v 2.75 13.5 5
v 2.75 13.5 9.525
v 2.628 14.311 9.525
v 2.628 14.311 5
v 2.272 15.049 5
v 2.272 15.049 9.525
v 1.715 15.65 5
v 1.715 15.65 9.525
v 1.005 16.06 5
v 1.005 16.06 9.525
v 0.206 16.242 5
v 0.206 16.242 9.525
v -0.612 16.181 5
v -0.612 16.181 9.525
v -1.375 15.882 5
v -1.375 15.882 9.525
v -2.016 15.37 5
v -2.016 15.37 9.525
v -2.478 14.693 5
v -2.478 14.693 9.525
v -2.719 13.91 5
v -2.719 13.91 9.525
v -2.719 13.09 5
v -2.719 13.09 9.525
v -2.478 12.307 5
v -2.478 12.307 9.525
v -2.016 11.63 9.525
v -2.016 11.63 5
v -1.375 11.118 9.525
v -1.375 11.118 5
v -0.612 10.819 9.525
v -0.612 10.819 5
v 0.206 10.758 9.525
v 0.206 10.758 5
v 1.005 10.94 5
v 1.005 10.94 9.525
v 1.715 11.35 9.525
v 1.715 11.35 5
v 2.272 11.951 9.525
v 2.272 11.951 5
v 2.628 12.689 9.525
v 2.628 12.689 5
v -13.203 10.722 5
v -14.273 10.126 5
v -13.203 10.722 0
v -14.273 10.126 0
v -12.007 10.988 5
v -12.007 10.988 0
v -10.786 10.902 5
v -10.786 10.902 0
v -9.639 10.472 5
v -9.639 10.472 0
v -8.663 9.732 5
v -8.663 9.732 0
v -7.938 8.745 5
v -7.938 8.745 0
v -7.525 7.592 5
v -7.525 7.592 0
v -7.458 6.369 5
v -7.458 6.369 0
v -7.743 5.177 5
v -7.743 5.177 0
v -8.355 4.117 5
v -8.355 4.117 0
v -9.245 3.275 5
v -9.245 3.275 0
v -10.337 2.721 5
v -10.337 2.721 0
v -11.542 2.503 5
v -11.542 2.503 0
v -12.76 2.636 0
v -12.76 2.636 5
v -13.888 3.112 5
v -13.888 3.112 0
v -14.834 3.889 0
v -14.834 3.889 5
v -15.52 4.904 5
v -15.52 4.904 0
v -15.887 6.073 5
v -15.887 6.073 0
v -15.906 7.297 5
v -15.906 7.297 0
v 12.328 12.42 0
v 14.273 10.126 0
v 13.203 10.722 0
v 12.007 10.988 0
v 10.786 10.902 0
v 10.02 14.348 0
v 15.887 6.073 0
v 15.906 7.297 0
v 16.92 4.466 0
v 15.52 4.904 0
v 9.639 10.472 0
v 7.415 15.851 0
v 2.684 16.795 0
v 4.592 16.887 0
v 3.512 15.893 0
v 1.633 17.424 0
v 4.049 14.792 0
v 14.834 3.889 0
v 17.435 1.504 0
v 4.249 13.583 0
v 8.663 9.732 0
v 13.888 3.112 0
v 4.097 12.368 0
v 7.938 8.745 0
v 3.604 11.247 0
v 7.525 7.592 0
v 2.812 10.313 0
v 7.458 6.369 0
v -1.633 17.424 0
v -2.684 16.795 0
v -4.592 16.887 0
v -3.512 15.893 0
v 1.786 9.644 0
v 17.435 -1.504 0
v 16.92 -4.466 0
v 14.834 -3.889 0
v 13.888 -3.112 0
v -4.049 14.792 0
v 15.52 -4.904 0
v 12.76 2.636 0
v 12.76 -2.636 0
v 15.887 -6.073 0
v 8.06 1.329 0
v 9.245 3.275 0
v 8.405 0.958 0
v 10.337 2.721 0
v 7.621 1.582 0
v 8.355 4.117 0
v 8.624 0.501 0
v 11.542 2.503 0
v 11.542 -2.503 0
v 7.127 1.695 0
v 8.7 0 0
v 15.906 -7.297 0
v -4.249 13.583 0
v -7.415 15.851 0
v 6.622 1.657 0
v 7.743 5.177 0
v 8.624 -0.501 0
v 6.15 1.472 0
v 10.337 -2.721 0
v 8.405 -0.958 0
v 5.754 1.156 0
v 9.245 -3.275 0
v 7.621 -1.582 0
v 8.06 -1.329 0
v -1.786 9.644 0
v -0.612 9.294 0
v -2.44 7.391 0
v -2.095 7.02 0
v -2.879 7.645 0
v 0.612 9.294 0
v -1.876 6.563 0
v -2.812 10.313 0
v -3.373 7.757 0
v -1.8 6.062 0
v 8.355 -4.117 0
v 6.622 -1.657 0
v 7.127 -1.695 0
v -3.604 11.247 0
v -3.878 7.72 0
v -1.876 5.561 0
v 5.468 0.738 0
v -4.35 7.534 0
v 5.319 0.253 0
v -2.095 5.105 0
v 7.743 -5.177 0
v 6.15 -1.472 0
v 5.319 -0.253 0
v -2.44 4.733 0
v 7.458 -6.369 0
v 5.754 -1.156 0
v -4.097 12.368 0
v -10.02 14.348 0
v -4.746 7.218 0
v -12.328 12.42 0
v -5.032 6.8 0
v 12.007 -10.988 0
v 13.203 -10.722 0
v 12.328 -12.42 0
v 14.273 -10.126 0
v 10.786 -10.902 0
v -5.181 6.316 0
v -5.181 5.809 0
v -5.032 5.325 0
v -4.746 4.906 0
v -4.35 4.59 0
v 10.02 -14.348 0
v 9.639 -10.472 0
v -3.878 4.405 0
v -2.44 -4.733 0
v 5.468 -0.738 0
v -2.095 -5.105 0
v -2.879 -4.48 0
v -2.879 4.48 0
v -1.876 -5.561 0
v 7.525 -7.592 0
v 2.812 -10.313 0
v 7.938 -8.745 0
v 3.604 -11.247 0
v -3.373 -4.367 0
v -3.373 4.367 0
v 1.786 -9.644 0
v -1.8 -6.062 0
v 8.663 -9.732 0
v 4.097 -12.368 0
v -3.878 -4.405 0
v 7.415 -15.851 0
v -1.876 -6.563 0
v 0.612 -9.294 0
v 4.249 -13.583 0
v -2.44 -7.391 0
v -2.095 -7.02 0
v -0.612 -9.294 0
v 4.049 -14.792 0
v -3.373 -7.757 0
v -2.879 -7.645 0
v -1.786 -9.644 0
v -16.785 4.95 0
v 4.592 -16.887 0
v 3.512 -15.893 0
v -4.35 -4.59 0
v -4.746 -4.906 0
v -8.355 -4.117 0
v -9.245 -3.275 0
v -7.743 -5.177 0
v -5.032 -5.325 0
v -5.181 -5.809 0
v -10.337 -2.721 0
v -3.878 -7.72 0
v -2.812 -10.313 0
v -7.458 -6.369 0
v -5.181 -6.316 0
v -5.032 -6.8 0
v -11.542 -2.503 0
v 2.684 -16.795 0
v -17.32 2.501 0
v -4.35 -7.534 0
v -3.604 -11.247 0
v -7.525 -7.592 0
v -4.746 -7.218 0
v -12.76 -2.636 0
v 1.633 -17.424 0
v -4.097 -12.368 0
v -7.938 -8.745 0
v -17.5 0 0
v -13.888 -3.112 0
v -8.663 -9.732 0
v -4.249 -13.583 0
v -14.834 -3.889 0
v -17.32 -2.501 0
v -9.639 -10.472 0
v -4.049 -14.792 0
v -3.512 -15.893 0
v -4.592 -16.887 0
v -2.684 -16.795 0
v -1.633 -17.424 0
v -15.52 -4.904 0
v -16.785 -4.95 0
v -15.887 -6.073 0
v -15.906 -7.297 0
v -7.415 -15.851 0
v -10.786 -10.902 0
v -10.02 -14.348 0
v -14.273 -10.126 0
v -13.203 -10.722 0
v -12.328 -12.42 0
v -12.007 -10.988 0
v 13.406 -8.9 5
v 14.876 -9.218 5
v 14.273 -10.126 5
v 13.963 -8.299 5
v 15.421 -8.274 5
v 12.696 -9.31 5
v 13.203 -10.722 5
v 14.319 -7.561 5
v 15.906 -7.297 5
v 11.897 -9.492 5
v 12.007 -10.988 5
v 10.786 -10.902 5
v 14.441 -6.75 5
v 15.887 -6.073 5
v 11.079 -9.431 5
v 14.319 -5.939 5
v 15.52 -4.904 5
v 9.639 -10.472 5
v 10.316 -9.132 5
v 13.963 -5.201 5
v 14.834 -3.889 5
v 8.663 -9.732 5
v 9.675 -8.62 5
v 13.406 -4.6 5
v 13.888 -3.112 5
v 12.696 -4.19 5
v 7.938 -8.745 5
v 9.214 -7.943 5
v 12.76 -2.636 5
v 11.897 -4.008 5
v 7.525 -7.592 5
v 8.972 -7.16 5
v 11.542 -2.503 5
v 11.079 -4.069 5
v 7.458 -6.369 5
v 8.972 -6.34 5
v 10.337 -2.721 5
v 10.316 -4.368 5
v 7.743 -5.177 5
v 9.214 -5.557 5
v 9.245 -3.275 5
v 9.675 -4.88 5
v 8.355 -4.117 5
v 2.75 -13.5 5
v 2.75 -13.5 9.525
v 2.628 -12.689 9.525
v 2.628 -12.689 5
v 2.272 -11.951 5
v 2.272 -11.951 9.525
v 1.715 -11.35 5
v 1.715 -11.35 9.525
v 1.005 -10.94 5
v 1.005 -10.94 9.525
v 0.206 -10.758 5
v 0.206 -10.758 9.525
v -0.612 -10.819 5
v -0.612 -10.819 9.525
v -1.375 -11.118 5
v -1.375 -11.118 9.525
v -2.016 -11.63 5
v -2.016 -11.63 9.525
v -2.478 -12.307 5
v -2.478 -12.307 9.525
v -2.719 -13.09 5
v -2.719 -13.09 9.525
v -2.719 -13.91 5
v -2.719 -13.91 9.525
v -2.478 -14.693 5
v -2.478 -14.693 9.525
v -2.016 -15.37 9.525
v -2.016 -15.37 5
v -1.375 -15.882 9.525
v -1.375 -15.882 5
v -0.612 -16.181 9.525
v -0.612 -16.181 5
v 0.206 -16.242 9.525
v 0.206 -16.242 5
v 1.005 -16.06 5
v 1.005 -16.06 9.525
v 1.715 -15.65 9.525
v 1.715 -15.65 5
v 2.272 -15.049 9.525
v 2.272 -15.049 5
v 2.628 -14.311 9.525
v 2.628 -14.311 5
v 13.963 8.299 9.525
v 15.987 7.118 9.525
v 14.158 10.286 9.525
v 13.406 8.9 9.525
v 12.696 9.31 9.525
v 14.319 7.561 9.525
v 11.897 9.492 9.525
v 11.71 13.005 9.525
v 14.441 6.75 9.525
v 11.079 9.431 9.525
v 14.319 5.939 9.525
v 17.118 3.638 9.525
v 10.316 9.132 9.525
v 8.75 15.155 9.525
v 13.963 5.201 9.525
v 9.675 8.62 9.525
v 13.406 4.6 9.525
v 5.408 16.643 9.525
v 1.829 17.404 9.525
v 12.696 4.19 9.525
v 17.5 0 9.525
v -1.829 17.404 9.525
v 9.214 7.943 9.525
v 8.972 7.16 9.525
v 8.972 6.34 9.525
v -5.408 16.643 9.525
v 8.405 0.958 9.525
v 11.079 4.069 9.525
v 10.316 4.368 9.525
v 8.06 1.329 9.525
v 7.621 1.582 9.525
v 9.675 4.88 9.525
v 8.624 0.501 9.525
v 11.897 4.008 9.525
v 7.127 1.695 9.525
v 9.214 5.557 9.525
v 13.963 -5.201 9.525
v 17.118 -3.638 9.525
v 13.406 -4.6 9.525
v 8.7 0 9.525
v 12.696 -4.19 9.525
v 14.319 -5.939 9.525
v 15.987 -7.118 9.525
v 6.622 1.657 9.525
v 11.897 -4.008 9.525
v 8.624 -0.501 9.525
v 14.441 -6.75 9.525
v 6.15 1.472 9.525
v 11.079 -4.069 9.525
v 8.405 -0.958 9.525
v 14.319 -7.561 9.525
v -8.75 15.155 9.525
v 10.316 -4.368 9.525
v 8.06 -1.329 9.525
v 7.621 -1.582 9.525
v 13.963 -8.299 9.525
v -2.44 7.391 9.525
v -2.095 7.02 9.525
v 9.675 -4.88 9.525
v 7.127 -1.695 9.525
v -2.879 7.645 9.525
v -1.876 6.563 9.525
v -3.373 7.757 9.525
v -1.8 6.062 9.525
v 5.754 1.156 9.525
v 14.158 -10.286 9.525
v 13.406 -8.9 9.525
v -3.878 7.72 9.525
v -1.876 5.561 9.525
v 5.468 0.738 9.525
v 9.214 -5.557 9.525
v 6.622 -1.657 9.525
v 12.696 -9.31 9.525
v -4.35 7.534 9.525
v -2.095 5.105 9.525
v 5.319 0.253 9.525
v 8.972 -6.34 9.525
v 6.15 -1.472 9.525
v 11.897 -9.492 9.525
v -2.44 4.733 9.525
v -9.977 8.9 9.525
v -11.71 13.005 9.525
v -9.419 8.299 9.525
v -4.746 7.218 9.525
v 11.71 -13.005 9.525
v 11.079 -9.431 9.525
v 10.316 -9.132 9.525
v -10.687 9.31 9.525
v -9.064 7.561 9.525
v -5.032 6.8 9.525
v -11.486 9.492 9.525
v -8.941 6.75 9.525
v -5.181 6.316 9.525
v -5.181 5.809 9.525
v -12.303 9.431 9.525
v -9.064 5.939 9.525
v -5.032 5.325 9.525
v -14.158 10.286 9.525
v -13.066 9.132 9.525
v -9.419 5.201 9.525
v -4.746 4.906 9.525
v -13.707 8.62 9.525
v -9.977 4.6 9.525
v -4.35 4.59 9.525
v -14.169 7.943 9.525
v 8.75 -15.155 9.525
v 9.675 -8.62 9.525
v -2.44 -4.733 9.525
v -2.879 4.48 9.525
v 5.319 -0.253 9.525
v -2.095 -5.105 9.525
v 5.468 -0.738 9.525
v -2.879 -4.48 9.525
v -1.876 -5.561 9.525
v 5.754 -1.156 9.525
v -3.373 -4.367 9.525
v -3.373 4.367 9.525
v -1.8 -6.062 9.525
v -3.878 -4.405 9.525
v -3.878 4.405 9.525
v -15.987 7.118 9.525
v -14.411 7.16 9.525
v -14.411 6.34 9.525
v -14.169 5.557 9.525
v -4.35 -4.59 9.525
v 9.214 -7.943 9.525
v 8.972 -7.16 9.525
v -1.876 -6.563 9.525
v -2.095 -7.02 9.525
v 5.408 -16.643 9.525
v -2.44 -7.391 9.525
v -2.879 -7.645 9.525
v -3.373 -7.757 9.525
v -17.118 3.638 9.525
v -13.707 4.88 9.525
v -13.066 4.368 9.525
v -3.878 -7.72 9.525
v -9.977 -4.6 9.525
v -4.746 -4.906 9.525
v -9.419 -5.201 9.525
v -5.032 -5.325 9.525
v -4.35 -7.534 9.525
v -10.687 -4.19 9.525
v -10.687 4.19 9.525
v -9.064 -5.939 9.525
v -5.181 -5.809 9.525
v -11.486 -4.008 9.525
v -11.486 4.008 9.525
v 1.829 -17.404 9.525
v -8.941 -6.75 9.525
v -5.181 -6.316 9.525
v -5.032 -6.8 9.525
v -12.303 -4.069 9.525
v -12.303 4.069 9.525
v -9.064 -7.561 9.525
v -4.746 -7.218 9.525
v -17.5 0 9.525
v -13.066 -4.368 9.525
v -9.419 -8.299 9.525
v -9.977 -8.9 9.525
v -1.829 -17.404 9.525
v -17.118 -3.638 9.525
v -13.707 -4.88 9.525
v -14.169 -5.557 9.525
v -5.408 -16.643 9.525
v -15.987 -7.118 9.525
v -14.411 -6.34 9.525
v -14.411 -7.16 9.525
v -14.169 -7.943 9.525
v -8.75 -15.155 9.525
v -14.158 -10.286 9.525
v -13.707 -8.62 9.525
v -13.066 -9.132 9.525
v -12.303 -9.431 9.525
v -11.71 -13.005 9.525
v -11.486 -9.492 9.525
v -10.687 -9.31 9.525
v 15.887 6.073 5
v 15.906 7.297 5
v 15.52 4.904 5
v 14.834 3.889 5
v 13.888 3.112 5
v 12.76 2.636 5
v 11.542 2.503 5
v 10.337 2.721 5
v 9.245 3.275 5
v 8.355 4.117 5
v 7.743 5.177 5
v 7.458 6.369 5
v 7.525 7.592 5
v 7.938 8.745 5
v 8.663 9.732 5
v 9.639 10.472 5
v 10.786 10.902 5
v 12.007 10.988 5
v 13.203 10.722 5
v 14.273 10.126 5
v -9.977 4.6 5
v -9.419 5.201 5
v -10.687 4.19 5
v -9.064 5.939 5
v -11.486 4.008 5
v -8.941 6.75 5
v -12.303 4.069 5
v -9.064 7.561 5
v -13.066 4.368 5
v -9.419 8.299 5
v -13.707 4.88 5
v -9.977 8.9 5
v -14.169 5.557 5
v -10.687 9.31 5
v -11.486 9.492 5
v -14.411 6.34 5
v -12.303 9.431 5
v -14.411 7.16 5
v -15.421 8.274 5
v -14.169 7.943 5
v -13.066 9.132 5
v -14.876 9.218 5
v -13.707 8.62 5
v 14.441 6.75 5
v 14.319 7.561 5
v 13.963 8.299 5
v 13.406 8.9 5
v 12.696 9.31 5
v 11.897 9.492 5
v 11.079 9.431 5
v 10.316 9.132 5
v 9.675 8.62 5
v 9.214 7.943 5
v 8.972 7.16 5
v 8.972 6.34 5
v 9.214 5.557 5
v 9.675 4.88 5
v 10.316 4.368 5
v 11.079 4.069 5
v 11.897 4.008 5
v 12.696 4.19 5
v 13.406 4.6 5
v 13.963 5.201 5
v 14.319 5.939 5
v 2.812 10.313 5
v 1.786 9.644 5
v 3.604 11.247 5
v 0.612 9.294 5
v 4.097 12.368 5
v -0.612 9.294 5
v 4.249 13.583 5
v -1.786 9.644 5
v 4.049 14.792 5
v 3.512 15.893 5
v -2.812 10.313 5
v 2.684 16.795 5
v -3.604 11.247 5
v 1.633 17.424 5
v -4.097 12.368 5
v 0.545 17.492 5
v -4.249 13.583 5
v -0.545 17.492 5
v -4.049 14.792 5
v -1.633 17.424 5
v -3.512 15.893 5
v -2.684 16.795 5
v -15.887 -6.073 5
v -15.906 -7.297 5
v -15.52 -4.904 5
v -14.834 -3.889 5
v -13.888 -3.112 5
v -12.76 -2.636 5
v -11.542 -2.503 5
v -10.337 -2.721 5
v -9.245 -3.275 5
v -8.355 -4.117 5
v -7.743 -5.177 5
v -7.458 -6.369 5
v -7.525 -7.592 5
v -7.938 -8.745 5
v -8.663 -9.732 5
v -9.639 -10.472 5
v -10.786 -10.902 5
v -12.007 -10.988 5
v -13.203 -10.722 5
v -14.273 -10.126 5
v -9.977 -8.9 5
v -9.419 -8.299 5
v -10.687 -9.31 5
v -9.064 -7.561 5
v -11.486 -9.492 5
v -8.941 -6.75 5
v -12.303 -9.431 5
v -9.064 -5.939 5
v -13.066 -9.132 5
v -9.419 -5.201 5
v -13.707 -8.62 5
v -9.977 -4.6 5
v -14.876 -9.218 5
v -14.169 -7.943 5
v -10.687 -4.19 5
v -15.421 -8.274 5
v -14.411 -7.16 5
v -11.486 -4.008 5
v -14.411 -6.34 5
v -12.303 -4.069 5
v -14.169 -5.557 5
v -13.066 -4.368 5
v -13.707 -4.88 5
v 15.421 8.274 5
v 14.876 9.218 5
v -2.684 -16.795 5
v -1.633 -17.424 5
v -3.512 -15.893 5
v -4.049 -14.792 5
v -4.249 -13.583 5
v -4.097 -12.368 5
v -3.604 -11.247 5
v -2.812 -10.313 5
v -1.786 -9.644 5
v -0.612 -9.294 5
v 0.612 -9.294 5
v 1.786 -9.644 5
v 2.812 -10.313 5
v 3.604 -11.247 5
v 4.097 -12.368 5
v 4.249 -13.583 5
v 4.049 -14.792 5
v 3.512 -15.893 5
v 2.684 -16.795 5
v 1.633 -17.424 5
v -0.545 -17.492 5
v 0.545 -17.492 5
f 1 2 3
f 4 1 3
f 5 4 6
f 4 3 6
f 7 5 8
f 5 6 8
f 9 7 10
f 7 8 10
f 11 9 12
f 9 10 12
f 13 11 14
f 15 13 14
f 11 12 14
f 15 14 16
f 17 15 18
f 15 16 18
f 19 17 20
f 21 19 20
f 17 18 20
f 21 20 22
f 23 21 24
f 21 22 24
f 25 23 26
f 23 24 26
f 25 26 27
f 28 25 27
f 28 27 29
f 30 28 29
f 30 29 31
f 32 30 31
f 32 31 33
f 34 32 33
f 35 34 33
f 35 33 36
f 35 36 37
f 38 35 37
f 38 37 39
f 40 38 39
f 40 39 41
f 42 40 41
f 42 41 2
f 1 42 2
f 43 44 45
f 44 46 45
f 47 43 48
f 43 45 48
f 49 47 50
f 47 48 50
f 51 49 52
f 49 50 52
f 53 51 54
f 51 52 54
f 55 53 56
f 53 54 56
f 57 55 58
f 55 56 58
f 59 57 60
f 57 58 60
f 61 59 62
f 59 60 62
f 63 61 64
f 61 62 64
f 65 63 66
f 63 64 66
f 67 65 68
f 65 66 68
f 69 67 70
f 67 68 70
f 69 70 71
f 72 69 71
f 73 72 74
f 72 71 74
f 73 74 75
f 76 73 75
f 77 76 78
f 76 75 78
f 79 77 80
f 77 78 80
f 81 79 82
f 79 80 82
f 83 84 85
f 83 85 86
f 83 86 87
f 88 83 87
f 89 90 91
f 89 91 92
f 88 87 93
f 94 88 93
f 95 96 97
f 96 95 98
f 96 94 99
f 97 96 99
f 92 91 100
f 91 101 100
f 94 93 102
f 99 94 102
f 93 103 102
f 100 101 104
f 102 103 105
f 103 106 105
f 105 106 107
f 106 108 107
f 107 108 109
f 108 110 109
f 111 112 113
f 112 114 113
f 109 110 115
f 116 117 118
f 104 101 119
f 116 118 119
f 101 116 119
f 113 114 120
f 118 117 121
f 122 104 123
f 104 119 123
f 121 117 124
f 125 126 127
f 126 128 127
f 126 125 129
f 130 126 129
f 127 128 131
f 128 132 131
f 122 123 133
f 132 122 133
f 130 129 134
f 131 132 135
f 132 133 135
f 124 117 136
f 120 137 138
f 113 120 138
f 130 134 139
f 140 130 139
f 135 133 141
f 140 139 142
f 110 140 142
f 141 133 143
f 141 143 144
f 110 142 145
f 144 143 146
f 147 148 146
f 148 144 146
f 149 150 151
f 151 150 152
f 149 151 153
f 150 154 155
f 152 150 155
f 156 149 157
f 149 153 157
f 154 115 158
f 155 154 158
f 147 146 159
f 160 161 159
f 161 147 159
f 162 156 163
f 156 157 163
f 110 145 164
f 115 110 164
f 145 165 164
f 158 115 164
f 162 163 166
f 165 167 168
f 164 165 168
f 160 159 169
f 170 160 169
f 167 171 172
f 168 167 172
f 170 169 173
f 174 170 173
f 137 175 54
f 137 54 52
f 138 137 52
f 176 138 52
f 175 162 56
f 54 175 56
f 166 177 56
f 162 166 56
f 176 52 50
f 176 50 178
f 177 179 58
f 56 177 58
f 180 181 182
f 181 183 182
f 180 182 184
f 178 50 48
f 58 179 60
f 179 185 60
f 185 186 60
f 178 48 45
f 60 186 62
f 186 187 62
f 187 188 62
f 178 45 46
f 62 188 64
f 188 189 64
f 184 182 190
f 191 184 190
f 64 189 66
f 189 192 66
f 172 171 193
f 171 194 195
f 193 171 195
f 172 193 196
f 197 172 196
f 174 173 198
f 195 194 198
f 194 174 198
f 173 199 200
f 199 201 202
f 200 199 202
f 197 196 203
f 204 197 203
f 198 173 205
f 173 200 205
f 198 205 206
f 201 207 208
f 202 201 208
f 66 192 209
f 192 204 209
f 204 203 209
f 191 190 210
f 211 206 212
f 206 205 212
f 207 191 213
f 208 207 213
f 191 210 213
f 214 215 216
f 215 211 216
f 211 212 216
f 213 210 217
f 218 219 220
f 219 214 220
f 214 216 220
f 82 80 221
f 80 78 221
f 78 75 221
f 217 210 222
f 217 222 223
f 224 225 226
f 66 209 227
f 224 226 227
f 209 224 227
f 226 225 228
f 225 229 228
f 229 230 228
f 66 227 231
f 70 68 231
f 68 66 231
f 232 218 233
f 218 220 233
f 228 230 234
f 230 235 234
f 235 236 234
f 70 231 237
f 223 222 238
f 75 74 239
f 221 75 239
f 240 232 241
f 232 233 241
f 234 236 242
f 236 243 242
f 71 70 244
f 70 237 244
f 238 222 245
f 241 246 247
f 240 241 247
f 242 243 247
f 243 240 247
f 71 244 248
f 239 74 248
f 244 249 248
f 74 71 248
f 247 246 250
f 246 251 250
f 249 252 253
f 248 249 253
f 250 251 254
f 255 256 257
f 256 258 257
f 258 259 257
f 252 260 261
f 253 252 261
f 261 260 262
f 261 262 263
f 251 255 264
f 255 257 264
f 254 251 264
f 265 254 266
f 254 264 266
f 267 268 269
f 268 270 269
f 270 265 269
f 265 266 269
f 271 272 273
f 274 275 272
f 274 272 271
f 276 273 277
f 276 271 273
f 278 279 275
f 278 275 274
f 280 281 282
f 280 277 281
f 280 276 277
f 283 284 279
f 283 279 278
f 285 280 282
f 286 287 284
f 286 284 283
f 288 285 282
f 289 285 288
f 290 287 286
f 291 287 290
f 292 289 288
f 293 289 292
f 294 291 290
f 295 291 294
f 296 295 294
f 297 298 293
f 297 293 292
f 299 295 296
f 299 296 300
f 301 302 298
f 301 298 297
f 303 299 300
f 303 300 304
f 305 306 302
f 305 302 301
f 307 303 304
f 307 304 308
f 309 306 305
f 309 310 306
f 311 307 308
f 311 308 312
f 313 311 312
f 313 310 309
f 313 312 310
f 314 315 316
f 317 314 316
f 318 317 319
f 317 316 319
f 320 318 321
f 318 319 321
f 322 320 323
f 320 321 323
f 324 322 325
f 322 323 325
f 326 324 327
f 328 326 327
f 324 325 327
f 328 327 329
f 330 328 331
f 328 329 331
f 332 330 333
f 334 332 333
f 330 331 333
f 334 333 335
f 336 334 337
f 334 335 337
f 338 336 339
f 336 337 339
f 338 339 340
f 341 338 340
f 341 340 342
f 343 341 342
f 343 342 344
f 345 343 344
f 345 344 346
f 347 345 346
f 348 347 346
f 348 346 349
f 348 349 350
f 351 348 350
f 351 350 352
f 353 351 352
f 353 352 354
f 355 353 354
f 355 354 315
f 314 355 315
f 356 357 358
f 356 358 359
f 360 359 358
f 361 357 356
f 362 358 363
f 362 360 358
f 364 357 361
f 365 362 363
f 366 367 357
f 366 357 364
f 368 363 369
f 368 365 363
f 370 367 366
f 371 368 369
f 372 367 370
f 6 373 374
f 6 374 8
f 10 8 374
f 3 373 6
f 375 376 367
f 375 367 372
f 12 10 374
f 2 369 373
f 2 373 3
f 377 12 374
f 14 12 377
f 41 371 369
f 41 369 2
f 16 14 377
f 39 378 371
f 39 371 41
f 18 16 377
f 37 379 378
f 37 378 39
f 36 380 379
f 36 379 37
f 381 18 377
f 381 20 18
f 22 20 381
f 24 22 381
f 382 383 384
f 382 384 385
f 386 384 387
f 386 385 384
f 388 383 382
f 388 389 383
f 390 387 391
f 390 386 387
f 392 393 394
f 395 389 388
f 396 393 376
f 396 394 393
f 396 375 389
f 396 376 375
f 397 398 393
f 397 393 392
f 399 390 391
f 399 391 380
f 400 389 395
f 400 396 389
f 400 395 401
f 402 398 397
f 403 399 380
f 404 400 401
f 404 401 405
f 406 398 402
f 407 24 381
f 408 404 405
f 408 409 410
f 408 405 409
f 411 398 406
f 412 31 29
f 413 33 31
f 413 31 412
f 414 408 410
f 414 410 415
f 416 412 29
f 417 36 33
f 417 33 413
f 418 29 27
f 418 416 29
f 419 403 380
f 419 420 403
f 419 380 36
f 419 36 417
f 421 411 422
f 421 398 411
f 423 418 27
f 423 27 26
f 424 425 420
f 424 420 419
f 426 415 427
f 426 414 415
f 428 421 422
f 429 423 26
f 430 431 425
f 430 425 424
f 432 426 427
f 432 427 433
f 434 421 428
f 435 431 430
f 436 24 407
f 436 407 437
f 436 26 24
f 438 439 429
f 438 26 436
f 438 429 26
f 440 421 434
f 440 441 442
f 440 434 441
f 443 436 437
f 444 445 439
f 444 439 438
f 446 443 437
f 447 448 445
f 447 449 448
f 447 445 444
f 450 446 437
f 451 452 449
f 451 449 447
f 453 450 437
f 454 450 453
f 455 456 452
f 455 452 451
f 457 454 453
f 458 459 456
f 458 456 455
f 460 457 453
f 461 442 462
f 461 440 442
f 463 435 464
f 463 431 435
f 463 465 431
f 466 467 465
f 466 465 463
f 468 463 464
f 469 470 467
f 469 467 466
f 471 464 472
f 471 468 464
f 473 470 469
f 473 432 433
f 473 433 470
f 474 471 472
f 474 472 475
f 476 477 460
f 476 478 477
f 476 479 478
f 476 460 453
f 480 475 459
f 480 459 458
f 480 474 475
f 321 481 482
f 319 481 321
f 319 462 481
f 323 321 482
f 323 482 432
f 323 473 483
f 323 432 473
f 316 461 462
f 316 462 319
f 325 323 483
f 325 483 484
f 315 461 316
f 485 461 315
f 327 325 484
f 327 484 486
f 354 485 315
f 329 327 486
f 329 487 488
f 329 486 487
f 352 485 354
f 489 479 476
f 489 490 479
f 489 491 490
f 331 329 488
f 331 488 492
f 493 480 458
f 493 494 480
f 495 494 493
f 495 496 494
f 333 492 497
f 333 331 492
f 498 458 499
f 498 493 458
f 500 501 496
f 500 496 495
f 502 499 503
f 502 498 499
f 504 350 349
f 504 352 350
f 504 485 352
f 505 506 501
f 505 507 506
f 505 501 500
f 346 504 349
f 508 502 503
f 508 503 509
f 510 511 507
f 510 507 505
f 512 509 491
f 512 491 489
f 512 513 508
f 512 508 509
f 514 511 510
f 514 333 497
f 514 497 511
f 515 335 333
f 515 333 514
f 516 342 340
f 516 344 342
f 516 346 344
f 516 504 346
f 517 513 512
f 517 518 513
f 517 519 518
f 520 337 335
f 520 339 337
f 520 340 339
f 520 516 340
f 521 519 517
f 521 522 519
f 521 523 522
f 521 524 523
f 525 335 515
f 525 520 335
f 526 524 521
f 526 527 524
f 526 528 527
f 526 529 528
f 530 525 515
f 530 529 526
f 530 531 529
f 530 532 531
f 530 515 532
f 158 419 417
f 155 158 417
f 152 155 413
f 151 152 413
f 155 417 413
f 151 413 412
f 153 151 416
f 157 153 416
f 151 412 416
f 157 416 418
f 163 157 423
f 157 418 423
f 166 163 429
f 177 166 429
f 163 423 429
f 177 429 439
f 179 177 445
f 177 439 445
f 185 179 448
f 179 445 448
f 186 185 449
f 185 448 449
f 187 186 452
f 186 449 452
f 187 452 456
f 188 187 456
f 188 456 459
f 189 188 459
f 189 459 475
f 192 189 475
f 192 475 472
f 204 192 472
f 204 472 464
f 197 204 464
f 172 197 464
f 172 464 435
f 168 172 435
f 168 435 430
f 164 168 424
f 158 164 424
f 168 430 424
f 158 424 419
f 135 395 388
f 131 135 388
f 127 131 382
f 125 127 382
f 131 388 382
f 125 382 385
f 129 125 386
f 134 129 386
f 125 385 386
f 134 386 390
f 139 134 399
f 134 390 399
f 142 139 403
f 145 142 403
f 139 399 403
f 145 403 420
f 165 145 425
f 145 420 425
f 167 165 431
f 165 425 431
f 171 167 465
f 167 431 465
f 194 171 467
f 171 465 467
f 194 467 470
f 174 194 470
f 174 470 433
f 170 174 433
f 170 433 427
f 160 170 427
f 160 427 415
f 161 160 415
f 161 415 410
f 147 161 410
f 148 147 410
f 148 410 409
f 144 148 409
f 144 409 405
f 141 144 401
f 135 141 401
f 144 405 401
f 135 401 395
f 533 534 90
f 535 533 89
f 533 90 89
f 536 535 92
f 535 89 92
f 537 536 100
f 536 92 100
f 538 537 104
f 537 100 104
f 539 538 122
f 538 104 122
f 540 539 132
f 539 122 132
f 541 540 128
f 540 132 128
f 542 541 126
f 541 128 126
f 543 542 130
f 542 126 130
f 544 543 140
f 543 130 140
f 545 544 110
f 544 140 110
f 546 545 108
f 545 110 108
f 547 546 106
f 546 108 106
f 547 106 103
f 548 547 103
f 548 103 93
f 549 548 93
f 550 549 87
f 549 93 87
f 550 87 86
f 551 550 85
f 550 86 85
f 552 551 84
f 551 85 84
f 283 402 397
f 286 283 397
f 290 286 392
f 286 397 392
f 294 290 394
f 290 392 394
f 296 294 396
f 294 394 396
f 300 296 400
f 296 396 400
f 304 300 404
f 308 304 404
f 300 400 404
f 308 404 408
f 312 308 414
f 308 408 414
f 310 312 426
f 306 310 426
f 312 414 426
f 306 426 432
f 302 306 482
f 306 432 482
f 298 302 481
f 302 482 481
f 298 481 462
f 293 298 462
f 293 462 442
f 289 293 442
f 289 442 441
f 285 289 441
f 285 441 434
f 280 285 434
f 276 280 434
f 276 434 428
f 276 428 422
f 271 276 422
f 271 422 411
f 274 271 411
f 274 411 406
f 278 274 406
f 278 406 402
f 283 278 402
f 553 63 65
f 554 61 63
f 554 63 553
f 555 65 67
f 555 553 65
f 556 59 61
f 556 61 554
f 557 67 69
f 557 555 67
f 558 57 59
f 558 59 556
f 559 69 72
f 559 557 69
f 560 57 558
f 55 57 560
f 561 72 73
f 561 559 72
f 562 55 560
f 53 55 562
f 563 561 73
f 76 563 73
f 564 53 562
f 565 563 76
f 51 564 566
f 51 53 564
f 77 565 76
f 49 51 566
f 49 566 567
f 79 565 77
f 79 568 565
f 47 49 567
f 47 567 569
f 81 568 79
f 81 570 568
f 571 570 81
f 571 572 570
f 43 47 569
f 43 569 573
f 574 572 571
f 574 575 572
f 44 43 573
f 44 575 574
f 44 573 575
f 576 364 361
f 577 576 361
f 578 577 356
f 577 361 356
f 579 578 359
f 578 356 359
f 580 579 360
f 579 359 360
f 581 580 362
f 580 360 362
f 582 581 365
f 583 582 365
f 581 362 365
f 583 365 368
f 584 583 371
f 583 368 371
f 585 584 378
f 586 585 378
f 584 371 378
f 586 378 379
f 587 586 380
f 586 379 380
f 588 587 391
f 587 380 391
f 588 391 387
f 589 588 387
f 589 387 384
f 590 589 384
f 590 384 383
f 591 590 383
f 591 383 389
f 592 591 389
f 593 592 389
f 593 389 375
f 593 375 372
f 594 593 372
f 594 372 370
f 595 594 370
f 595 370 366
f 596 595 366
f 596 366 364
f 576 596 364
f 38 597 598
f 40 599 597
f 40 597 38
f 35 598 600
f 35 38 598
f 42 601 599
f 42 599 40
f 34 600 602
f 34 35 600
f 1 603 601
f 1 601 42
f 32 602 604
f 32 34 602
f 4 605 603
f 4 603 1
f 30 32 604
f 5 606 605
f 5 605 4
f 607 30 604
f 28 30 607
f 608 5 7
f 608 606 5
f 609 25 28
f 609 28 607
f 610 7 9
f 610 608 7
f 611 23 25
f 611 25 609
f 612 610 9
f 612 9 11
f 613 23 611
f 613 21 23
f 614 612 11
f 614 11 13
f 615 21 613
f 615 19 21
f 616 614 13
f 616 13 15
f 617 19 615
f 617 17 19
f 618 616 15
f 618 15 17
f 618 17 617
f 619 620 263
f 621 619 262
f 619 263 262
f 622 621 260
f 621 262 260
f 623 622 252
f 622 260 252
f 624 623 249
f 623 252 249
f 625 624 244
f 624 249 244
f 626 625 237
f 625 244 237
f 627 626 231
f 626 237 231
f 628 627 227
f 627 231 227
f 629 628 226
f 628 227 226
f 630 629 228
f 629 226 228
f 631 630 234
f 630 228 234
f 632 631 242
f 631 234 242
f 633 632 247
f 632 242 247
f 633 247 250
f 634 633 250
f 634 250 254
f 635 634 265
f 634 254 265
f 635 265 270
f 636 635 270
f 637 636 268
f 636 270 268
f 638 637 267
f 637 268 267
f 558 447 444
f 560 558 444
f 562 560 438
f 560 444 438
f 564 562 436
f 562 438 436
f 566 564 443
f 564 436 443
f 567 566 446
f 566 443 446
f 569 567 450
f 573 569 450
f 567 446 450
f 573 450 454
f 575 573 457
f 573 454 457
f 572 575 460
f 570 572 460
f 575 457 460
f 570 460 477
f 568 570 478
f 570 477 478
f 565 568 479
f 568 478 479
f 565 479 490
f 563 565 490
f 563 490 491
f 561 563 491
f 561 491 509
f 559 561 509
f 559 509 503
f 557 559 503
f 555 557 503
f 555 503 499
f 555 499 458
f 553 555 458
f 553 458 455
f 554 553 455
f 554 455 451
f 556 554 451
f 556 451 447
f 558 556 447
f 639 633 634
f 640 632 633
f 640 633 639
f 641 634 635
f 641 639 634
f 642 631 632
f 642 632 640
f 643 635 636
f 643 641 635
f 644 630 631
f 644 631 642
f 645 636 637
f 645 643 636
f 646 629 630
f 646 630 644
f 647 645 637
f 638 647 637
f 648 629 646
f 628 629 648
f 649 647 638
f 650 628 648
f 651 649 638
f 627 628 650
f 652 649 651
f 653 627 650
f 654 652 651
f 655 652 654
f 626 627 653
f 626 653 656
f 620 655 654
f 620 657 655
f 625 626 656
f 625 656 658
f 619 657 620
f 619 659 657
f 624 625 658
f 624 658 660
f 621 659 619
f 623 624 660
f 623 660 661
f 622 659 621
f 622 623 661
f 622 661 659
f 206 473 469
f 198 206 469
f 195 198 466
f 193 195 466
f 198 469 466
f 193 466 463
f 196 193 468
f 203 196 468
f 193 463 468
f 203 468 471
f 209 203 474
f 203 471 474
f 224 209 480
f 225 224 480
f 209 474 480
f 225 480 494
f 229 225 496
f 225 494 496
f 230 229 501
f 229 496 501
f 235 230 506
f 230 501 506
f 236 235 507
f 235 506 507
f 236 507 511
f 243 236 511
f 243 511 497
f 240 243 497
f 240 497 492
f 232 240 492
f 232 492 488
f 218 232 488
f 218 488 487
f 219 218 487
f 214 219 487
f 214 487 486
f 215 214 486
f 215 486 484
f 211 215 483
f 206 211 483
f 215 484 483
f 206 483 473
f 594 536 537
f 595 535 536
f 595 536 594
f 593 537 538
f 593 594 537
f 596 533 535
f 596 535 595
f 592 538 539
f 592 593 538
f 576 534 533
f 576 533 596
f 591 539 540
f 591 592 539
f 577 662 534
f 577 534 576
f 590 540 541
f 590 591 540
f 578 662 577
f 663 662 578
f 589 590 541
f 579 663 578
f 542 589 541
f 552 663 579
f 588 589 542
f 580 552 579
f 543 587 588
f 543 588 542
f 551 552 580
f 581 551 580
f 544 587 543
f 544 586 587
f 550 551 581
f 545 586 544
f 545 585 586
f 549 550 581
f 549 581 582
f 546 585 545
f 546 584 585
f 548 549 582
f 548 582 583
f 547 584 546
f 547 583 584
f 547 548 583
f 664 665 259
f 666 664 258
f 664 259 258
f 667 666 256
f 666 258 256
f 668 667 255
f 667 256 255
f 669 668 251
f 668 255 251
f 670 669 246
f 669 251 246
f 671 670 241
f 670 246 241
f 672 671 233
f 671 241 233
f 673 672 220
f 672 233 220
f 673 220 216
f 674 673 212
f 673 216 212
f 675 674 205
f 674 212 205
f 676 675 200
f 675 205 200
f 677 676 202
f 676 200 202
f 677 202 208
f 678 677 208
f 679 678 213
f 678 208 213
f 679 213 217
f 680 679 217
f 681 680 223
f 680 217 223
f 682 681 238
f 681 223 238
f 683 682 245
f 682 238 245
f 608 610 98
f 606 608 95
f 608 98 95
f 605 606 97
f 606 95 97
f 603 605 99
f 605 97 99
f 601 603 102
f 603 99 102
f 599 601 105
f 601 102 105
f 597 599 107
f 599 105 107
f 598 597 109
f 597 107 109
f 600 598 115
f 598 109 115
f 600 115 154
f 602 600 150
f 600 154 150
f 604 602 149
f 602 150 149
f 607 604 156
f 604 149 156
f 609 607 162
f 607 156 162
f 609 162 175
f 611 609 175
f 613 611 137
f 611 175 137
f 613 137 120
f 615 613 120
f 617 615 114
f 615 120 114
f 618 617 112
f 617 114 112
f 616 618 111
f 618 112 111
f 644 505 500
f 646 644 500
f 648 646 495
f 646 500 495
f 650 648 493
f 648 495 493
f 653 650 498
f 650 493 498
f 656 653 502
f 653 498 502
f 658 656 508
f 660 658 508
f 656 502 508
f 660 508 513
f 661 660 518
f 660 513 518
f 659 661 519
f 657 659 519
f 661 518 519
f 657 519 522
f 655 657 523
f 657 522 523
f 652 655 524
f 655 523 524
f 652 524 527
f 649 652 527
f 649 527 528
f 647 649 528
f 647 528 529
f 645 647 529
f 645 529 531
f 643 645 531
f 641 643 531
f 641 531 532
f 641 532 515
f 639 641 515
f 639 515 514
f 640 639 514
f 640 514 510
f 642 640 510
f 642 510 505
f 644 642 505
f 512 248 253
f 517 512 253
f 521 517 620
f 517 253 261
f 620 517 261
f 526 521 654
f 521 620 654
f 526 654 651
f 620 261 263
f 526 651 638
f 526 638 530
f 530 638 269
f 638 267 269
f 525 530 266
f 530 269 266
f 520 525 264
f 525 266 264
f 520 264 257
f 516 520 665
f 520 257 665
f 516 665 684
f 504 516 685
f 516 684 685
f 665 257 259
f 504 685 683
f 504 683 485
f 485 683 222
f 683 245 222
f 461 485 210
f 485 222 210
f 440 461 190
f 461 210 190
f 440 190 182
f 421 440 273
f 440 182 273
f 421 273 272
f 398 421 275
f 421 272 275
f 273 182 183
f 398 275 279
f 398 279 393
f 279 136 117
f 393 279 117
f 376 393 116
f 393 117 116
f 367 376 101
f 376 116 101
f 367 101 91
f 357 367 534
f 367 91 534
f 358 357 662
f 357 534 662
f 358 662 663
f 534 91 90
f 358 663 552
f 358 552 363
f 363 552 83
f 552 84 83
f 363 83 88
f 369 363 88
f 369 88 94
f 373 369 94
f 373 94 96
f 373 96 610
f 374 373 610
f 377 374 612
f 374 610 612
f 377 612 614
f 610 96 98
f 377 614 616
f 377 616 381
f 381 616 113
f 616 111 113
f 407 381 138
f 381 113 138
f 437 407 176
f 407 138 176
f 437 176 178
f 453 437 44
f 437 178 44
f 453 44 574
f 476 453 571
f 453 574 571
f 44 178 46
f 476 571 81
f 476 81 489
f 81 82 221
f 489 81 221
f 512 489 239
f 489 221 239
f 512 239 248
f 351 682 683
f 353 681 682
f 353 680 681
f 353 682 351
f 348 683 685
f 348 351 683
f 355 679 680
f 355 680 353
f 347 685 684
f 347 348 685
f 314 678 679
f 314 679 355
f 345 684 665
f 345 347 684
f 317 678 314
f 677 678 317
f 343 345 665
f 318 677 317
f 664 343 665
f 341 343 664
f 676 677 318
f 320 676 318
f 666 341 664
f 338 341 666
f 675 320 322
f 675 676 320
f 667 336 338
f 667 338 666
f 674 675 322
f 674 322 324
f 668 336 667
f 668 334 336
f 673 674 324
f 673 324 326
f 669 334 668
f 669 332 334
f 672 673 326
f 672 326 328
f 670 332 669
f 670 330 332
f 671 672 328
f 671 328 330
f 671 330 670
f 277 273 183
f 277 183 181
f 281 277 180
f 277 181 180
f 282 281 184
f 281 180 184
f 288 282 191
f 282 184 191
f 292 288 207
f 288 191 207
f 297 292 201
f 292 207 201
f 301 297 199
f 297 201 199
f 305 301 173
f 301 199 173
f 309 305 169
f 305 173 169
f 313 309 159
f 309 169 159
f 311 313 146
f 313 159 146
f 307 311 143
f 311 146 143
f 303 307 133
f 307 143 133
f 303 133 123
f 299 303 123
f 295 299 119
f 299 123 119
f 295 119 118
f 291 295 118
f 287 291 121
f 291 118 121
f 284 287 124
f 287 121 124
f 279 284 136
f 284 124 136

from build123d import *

# Parameters (mm, degrees)
SKETCH1_R           = 17.5
BOSS_EXTRUDE1_DEPTH = 9.525
SKETCH2_R           = 2.75
M5_THROUGH_DEPTH    = 9.525
SKETCH3_R           = 1.7
M4_DRILL_DEPTH      = 9.525
SKETCH4_R           = 4.25
CUT_EXTRUDE2_DEPTH  = 5


with BuildPart() as part:
    # Sketch1 → Boss-Extrude1 (new body)
    with BuildSketch(Plane.XY):
        with Locations(Location((0, 0, 0), (0, 0, 180))):
            Circle(SKETCH1_R)
    extrude(amount=BOSS_EXTRUDE1_DEPTH)

    # Sketch2 → M5_through (cut)
    with BuildSketch(Plane.XY.offset(9.525)):
        with Locations((0, 13.5)):
            Circle(SKETCH2_R)
        with Locations((11.691342951, 6.75)):
            Circle(SKETCH2_R)
        with Locations((11.691342951, -6.75)):
            Circle(SKETCH2_R)
        with Locations((0, -13.5)):
            Circle(SKETCH2_R)
        with Locations((-11.691342951, -6.75)):
            Circle(SKETCH2_R)
        with Locations((-11.691342951, 6.75)):
            Circle(SKETCH2_R)
    extrude(amount=-M5_THROUGH_DEPTH, mode=Mode.SUBTRACT)

    # Sketch3 → M4_DRILL (cut)
    with BuildSketch(Plane.XY.offset(9.525)):
        with Locations((-3.5, 6.062177826)):
            Circle(SKETCH3_R)
        with Locations((7, 0)):
            Circle(SKETCH3_R)
        with Locations((-3.5, -6.062177826)):
            Circle(SKETCH3_R)
    extrude(amount=-M4_DRILL_DEPTH, mode=Mode.SUBTRACT)

    # Sketch4 → Cut-Extrude2 (cut)
    with BuildSketch(Plane(origin=(0, 0, 0), x_dir=(-1, 0, 0), z_dir=(0, 0, -1))):
        with Locations((0, 13.5)):
            Circle(SKETCH4_R)
        with Locations((11.691342951, 6.75)):
            Circle(SKETCH4_R)
        with Locations((11.691342951, -6.75)):
            Circle(SKETCH4_R)
        with Locations((0, -13.5)):
            Circle(SKETCH4_R)
        with Locations((-11.691342951, -6.75)):
            Circle(SKETCH4_R)
        with Locations((-11.691342951, 6.75)):
            Circle(SKETCH4_R)
    extrude(amount=-CUT_EXTRUDE2_DEPTH, mode=Mode.SUBTRACT)


solid = part.part
